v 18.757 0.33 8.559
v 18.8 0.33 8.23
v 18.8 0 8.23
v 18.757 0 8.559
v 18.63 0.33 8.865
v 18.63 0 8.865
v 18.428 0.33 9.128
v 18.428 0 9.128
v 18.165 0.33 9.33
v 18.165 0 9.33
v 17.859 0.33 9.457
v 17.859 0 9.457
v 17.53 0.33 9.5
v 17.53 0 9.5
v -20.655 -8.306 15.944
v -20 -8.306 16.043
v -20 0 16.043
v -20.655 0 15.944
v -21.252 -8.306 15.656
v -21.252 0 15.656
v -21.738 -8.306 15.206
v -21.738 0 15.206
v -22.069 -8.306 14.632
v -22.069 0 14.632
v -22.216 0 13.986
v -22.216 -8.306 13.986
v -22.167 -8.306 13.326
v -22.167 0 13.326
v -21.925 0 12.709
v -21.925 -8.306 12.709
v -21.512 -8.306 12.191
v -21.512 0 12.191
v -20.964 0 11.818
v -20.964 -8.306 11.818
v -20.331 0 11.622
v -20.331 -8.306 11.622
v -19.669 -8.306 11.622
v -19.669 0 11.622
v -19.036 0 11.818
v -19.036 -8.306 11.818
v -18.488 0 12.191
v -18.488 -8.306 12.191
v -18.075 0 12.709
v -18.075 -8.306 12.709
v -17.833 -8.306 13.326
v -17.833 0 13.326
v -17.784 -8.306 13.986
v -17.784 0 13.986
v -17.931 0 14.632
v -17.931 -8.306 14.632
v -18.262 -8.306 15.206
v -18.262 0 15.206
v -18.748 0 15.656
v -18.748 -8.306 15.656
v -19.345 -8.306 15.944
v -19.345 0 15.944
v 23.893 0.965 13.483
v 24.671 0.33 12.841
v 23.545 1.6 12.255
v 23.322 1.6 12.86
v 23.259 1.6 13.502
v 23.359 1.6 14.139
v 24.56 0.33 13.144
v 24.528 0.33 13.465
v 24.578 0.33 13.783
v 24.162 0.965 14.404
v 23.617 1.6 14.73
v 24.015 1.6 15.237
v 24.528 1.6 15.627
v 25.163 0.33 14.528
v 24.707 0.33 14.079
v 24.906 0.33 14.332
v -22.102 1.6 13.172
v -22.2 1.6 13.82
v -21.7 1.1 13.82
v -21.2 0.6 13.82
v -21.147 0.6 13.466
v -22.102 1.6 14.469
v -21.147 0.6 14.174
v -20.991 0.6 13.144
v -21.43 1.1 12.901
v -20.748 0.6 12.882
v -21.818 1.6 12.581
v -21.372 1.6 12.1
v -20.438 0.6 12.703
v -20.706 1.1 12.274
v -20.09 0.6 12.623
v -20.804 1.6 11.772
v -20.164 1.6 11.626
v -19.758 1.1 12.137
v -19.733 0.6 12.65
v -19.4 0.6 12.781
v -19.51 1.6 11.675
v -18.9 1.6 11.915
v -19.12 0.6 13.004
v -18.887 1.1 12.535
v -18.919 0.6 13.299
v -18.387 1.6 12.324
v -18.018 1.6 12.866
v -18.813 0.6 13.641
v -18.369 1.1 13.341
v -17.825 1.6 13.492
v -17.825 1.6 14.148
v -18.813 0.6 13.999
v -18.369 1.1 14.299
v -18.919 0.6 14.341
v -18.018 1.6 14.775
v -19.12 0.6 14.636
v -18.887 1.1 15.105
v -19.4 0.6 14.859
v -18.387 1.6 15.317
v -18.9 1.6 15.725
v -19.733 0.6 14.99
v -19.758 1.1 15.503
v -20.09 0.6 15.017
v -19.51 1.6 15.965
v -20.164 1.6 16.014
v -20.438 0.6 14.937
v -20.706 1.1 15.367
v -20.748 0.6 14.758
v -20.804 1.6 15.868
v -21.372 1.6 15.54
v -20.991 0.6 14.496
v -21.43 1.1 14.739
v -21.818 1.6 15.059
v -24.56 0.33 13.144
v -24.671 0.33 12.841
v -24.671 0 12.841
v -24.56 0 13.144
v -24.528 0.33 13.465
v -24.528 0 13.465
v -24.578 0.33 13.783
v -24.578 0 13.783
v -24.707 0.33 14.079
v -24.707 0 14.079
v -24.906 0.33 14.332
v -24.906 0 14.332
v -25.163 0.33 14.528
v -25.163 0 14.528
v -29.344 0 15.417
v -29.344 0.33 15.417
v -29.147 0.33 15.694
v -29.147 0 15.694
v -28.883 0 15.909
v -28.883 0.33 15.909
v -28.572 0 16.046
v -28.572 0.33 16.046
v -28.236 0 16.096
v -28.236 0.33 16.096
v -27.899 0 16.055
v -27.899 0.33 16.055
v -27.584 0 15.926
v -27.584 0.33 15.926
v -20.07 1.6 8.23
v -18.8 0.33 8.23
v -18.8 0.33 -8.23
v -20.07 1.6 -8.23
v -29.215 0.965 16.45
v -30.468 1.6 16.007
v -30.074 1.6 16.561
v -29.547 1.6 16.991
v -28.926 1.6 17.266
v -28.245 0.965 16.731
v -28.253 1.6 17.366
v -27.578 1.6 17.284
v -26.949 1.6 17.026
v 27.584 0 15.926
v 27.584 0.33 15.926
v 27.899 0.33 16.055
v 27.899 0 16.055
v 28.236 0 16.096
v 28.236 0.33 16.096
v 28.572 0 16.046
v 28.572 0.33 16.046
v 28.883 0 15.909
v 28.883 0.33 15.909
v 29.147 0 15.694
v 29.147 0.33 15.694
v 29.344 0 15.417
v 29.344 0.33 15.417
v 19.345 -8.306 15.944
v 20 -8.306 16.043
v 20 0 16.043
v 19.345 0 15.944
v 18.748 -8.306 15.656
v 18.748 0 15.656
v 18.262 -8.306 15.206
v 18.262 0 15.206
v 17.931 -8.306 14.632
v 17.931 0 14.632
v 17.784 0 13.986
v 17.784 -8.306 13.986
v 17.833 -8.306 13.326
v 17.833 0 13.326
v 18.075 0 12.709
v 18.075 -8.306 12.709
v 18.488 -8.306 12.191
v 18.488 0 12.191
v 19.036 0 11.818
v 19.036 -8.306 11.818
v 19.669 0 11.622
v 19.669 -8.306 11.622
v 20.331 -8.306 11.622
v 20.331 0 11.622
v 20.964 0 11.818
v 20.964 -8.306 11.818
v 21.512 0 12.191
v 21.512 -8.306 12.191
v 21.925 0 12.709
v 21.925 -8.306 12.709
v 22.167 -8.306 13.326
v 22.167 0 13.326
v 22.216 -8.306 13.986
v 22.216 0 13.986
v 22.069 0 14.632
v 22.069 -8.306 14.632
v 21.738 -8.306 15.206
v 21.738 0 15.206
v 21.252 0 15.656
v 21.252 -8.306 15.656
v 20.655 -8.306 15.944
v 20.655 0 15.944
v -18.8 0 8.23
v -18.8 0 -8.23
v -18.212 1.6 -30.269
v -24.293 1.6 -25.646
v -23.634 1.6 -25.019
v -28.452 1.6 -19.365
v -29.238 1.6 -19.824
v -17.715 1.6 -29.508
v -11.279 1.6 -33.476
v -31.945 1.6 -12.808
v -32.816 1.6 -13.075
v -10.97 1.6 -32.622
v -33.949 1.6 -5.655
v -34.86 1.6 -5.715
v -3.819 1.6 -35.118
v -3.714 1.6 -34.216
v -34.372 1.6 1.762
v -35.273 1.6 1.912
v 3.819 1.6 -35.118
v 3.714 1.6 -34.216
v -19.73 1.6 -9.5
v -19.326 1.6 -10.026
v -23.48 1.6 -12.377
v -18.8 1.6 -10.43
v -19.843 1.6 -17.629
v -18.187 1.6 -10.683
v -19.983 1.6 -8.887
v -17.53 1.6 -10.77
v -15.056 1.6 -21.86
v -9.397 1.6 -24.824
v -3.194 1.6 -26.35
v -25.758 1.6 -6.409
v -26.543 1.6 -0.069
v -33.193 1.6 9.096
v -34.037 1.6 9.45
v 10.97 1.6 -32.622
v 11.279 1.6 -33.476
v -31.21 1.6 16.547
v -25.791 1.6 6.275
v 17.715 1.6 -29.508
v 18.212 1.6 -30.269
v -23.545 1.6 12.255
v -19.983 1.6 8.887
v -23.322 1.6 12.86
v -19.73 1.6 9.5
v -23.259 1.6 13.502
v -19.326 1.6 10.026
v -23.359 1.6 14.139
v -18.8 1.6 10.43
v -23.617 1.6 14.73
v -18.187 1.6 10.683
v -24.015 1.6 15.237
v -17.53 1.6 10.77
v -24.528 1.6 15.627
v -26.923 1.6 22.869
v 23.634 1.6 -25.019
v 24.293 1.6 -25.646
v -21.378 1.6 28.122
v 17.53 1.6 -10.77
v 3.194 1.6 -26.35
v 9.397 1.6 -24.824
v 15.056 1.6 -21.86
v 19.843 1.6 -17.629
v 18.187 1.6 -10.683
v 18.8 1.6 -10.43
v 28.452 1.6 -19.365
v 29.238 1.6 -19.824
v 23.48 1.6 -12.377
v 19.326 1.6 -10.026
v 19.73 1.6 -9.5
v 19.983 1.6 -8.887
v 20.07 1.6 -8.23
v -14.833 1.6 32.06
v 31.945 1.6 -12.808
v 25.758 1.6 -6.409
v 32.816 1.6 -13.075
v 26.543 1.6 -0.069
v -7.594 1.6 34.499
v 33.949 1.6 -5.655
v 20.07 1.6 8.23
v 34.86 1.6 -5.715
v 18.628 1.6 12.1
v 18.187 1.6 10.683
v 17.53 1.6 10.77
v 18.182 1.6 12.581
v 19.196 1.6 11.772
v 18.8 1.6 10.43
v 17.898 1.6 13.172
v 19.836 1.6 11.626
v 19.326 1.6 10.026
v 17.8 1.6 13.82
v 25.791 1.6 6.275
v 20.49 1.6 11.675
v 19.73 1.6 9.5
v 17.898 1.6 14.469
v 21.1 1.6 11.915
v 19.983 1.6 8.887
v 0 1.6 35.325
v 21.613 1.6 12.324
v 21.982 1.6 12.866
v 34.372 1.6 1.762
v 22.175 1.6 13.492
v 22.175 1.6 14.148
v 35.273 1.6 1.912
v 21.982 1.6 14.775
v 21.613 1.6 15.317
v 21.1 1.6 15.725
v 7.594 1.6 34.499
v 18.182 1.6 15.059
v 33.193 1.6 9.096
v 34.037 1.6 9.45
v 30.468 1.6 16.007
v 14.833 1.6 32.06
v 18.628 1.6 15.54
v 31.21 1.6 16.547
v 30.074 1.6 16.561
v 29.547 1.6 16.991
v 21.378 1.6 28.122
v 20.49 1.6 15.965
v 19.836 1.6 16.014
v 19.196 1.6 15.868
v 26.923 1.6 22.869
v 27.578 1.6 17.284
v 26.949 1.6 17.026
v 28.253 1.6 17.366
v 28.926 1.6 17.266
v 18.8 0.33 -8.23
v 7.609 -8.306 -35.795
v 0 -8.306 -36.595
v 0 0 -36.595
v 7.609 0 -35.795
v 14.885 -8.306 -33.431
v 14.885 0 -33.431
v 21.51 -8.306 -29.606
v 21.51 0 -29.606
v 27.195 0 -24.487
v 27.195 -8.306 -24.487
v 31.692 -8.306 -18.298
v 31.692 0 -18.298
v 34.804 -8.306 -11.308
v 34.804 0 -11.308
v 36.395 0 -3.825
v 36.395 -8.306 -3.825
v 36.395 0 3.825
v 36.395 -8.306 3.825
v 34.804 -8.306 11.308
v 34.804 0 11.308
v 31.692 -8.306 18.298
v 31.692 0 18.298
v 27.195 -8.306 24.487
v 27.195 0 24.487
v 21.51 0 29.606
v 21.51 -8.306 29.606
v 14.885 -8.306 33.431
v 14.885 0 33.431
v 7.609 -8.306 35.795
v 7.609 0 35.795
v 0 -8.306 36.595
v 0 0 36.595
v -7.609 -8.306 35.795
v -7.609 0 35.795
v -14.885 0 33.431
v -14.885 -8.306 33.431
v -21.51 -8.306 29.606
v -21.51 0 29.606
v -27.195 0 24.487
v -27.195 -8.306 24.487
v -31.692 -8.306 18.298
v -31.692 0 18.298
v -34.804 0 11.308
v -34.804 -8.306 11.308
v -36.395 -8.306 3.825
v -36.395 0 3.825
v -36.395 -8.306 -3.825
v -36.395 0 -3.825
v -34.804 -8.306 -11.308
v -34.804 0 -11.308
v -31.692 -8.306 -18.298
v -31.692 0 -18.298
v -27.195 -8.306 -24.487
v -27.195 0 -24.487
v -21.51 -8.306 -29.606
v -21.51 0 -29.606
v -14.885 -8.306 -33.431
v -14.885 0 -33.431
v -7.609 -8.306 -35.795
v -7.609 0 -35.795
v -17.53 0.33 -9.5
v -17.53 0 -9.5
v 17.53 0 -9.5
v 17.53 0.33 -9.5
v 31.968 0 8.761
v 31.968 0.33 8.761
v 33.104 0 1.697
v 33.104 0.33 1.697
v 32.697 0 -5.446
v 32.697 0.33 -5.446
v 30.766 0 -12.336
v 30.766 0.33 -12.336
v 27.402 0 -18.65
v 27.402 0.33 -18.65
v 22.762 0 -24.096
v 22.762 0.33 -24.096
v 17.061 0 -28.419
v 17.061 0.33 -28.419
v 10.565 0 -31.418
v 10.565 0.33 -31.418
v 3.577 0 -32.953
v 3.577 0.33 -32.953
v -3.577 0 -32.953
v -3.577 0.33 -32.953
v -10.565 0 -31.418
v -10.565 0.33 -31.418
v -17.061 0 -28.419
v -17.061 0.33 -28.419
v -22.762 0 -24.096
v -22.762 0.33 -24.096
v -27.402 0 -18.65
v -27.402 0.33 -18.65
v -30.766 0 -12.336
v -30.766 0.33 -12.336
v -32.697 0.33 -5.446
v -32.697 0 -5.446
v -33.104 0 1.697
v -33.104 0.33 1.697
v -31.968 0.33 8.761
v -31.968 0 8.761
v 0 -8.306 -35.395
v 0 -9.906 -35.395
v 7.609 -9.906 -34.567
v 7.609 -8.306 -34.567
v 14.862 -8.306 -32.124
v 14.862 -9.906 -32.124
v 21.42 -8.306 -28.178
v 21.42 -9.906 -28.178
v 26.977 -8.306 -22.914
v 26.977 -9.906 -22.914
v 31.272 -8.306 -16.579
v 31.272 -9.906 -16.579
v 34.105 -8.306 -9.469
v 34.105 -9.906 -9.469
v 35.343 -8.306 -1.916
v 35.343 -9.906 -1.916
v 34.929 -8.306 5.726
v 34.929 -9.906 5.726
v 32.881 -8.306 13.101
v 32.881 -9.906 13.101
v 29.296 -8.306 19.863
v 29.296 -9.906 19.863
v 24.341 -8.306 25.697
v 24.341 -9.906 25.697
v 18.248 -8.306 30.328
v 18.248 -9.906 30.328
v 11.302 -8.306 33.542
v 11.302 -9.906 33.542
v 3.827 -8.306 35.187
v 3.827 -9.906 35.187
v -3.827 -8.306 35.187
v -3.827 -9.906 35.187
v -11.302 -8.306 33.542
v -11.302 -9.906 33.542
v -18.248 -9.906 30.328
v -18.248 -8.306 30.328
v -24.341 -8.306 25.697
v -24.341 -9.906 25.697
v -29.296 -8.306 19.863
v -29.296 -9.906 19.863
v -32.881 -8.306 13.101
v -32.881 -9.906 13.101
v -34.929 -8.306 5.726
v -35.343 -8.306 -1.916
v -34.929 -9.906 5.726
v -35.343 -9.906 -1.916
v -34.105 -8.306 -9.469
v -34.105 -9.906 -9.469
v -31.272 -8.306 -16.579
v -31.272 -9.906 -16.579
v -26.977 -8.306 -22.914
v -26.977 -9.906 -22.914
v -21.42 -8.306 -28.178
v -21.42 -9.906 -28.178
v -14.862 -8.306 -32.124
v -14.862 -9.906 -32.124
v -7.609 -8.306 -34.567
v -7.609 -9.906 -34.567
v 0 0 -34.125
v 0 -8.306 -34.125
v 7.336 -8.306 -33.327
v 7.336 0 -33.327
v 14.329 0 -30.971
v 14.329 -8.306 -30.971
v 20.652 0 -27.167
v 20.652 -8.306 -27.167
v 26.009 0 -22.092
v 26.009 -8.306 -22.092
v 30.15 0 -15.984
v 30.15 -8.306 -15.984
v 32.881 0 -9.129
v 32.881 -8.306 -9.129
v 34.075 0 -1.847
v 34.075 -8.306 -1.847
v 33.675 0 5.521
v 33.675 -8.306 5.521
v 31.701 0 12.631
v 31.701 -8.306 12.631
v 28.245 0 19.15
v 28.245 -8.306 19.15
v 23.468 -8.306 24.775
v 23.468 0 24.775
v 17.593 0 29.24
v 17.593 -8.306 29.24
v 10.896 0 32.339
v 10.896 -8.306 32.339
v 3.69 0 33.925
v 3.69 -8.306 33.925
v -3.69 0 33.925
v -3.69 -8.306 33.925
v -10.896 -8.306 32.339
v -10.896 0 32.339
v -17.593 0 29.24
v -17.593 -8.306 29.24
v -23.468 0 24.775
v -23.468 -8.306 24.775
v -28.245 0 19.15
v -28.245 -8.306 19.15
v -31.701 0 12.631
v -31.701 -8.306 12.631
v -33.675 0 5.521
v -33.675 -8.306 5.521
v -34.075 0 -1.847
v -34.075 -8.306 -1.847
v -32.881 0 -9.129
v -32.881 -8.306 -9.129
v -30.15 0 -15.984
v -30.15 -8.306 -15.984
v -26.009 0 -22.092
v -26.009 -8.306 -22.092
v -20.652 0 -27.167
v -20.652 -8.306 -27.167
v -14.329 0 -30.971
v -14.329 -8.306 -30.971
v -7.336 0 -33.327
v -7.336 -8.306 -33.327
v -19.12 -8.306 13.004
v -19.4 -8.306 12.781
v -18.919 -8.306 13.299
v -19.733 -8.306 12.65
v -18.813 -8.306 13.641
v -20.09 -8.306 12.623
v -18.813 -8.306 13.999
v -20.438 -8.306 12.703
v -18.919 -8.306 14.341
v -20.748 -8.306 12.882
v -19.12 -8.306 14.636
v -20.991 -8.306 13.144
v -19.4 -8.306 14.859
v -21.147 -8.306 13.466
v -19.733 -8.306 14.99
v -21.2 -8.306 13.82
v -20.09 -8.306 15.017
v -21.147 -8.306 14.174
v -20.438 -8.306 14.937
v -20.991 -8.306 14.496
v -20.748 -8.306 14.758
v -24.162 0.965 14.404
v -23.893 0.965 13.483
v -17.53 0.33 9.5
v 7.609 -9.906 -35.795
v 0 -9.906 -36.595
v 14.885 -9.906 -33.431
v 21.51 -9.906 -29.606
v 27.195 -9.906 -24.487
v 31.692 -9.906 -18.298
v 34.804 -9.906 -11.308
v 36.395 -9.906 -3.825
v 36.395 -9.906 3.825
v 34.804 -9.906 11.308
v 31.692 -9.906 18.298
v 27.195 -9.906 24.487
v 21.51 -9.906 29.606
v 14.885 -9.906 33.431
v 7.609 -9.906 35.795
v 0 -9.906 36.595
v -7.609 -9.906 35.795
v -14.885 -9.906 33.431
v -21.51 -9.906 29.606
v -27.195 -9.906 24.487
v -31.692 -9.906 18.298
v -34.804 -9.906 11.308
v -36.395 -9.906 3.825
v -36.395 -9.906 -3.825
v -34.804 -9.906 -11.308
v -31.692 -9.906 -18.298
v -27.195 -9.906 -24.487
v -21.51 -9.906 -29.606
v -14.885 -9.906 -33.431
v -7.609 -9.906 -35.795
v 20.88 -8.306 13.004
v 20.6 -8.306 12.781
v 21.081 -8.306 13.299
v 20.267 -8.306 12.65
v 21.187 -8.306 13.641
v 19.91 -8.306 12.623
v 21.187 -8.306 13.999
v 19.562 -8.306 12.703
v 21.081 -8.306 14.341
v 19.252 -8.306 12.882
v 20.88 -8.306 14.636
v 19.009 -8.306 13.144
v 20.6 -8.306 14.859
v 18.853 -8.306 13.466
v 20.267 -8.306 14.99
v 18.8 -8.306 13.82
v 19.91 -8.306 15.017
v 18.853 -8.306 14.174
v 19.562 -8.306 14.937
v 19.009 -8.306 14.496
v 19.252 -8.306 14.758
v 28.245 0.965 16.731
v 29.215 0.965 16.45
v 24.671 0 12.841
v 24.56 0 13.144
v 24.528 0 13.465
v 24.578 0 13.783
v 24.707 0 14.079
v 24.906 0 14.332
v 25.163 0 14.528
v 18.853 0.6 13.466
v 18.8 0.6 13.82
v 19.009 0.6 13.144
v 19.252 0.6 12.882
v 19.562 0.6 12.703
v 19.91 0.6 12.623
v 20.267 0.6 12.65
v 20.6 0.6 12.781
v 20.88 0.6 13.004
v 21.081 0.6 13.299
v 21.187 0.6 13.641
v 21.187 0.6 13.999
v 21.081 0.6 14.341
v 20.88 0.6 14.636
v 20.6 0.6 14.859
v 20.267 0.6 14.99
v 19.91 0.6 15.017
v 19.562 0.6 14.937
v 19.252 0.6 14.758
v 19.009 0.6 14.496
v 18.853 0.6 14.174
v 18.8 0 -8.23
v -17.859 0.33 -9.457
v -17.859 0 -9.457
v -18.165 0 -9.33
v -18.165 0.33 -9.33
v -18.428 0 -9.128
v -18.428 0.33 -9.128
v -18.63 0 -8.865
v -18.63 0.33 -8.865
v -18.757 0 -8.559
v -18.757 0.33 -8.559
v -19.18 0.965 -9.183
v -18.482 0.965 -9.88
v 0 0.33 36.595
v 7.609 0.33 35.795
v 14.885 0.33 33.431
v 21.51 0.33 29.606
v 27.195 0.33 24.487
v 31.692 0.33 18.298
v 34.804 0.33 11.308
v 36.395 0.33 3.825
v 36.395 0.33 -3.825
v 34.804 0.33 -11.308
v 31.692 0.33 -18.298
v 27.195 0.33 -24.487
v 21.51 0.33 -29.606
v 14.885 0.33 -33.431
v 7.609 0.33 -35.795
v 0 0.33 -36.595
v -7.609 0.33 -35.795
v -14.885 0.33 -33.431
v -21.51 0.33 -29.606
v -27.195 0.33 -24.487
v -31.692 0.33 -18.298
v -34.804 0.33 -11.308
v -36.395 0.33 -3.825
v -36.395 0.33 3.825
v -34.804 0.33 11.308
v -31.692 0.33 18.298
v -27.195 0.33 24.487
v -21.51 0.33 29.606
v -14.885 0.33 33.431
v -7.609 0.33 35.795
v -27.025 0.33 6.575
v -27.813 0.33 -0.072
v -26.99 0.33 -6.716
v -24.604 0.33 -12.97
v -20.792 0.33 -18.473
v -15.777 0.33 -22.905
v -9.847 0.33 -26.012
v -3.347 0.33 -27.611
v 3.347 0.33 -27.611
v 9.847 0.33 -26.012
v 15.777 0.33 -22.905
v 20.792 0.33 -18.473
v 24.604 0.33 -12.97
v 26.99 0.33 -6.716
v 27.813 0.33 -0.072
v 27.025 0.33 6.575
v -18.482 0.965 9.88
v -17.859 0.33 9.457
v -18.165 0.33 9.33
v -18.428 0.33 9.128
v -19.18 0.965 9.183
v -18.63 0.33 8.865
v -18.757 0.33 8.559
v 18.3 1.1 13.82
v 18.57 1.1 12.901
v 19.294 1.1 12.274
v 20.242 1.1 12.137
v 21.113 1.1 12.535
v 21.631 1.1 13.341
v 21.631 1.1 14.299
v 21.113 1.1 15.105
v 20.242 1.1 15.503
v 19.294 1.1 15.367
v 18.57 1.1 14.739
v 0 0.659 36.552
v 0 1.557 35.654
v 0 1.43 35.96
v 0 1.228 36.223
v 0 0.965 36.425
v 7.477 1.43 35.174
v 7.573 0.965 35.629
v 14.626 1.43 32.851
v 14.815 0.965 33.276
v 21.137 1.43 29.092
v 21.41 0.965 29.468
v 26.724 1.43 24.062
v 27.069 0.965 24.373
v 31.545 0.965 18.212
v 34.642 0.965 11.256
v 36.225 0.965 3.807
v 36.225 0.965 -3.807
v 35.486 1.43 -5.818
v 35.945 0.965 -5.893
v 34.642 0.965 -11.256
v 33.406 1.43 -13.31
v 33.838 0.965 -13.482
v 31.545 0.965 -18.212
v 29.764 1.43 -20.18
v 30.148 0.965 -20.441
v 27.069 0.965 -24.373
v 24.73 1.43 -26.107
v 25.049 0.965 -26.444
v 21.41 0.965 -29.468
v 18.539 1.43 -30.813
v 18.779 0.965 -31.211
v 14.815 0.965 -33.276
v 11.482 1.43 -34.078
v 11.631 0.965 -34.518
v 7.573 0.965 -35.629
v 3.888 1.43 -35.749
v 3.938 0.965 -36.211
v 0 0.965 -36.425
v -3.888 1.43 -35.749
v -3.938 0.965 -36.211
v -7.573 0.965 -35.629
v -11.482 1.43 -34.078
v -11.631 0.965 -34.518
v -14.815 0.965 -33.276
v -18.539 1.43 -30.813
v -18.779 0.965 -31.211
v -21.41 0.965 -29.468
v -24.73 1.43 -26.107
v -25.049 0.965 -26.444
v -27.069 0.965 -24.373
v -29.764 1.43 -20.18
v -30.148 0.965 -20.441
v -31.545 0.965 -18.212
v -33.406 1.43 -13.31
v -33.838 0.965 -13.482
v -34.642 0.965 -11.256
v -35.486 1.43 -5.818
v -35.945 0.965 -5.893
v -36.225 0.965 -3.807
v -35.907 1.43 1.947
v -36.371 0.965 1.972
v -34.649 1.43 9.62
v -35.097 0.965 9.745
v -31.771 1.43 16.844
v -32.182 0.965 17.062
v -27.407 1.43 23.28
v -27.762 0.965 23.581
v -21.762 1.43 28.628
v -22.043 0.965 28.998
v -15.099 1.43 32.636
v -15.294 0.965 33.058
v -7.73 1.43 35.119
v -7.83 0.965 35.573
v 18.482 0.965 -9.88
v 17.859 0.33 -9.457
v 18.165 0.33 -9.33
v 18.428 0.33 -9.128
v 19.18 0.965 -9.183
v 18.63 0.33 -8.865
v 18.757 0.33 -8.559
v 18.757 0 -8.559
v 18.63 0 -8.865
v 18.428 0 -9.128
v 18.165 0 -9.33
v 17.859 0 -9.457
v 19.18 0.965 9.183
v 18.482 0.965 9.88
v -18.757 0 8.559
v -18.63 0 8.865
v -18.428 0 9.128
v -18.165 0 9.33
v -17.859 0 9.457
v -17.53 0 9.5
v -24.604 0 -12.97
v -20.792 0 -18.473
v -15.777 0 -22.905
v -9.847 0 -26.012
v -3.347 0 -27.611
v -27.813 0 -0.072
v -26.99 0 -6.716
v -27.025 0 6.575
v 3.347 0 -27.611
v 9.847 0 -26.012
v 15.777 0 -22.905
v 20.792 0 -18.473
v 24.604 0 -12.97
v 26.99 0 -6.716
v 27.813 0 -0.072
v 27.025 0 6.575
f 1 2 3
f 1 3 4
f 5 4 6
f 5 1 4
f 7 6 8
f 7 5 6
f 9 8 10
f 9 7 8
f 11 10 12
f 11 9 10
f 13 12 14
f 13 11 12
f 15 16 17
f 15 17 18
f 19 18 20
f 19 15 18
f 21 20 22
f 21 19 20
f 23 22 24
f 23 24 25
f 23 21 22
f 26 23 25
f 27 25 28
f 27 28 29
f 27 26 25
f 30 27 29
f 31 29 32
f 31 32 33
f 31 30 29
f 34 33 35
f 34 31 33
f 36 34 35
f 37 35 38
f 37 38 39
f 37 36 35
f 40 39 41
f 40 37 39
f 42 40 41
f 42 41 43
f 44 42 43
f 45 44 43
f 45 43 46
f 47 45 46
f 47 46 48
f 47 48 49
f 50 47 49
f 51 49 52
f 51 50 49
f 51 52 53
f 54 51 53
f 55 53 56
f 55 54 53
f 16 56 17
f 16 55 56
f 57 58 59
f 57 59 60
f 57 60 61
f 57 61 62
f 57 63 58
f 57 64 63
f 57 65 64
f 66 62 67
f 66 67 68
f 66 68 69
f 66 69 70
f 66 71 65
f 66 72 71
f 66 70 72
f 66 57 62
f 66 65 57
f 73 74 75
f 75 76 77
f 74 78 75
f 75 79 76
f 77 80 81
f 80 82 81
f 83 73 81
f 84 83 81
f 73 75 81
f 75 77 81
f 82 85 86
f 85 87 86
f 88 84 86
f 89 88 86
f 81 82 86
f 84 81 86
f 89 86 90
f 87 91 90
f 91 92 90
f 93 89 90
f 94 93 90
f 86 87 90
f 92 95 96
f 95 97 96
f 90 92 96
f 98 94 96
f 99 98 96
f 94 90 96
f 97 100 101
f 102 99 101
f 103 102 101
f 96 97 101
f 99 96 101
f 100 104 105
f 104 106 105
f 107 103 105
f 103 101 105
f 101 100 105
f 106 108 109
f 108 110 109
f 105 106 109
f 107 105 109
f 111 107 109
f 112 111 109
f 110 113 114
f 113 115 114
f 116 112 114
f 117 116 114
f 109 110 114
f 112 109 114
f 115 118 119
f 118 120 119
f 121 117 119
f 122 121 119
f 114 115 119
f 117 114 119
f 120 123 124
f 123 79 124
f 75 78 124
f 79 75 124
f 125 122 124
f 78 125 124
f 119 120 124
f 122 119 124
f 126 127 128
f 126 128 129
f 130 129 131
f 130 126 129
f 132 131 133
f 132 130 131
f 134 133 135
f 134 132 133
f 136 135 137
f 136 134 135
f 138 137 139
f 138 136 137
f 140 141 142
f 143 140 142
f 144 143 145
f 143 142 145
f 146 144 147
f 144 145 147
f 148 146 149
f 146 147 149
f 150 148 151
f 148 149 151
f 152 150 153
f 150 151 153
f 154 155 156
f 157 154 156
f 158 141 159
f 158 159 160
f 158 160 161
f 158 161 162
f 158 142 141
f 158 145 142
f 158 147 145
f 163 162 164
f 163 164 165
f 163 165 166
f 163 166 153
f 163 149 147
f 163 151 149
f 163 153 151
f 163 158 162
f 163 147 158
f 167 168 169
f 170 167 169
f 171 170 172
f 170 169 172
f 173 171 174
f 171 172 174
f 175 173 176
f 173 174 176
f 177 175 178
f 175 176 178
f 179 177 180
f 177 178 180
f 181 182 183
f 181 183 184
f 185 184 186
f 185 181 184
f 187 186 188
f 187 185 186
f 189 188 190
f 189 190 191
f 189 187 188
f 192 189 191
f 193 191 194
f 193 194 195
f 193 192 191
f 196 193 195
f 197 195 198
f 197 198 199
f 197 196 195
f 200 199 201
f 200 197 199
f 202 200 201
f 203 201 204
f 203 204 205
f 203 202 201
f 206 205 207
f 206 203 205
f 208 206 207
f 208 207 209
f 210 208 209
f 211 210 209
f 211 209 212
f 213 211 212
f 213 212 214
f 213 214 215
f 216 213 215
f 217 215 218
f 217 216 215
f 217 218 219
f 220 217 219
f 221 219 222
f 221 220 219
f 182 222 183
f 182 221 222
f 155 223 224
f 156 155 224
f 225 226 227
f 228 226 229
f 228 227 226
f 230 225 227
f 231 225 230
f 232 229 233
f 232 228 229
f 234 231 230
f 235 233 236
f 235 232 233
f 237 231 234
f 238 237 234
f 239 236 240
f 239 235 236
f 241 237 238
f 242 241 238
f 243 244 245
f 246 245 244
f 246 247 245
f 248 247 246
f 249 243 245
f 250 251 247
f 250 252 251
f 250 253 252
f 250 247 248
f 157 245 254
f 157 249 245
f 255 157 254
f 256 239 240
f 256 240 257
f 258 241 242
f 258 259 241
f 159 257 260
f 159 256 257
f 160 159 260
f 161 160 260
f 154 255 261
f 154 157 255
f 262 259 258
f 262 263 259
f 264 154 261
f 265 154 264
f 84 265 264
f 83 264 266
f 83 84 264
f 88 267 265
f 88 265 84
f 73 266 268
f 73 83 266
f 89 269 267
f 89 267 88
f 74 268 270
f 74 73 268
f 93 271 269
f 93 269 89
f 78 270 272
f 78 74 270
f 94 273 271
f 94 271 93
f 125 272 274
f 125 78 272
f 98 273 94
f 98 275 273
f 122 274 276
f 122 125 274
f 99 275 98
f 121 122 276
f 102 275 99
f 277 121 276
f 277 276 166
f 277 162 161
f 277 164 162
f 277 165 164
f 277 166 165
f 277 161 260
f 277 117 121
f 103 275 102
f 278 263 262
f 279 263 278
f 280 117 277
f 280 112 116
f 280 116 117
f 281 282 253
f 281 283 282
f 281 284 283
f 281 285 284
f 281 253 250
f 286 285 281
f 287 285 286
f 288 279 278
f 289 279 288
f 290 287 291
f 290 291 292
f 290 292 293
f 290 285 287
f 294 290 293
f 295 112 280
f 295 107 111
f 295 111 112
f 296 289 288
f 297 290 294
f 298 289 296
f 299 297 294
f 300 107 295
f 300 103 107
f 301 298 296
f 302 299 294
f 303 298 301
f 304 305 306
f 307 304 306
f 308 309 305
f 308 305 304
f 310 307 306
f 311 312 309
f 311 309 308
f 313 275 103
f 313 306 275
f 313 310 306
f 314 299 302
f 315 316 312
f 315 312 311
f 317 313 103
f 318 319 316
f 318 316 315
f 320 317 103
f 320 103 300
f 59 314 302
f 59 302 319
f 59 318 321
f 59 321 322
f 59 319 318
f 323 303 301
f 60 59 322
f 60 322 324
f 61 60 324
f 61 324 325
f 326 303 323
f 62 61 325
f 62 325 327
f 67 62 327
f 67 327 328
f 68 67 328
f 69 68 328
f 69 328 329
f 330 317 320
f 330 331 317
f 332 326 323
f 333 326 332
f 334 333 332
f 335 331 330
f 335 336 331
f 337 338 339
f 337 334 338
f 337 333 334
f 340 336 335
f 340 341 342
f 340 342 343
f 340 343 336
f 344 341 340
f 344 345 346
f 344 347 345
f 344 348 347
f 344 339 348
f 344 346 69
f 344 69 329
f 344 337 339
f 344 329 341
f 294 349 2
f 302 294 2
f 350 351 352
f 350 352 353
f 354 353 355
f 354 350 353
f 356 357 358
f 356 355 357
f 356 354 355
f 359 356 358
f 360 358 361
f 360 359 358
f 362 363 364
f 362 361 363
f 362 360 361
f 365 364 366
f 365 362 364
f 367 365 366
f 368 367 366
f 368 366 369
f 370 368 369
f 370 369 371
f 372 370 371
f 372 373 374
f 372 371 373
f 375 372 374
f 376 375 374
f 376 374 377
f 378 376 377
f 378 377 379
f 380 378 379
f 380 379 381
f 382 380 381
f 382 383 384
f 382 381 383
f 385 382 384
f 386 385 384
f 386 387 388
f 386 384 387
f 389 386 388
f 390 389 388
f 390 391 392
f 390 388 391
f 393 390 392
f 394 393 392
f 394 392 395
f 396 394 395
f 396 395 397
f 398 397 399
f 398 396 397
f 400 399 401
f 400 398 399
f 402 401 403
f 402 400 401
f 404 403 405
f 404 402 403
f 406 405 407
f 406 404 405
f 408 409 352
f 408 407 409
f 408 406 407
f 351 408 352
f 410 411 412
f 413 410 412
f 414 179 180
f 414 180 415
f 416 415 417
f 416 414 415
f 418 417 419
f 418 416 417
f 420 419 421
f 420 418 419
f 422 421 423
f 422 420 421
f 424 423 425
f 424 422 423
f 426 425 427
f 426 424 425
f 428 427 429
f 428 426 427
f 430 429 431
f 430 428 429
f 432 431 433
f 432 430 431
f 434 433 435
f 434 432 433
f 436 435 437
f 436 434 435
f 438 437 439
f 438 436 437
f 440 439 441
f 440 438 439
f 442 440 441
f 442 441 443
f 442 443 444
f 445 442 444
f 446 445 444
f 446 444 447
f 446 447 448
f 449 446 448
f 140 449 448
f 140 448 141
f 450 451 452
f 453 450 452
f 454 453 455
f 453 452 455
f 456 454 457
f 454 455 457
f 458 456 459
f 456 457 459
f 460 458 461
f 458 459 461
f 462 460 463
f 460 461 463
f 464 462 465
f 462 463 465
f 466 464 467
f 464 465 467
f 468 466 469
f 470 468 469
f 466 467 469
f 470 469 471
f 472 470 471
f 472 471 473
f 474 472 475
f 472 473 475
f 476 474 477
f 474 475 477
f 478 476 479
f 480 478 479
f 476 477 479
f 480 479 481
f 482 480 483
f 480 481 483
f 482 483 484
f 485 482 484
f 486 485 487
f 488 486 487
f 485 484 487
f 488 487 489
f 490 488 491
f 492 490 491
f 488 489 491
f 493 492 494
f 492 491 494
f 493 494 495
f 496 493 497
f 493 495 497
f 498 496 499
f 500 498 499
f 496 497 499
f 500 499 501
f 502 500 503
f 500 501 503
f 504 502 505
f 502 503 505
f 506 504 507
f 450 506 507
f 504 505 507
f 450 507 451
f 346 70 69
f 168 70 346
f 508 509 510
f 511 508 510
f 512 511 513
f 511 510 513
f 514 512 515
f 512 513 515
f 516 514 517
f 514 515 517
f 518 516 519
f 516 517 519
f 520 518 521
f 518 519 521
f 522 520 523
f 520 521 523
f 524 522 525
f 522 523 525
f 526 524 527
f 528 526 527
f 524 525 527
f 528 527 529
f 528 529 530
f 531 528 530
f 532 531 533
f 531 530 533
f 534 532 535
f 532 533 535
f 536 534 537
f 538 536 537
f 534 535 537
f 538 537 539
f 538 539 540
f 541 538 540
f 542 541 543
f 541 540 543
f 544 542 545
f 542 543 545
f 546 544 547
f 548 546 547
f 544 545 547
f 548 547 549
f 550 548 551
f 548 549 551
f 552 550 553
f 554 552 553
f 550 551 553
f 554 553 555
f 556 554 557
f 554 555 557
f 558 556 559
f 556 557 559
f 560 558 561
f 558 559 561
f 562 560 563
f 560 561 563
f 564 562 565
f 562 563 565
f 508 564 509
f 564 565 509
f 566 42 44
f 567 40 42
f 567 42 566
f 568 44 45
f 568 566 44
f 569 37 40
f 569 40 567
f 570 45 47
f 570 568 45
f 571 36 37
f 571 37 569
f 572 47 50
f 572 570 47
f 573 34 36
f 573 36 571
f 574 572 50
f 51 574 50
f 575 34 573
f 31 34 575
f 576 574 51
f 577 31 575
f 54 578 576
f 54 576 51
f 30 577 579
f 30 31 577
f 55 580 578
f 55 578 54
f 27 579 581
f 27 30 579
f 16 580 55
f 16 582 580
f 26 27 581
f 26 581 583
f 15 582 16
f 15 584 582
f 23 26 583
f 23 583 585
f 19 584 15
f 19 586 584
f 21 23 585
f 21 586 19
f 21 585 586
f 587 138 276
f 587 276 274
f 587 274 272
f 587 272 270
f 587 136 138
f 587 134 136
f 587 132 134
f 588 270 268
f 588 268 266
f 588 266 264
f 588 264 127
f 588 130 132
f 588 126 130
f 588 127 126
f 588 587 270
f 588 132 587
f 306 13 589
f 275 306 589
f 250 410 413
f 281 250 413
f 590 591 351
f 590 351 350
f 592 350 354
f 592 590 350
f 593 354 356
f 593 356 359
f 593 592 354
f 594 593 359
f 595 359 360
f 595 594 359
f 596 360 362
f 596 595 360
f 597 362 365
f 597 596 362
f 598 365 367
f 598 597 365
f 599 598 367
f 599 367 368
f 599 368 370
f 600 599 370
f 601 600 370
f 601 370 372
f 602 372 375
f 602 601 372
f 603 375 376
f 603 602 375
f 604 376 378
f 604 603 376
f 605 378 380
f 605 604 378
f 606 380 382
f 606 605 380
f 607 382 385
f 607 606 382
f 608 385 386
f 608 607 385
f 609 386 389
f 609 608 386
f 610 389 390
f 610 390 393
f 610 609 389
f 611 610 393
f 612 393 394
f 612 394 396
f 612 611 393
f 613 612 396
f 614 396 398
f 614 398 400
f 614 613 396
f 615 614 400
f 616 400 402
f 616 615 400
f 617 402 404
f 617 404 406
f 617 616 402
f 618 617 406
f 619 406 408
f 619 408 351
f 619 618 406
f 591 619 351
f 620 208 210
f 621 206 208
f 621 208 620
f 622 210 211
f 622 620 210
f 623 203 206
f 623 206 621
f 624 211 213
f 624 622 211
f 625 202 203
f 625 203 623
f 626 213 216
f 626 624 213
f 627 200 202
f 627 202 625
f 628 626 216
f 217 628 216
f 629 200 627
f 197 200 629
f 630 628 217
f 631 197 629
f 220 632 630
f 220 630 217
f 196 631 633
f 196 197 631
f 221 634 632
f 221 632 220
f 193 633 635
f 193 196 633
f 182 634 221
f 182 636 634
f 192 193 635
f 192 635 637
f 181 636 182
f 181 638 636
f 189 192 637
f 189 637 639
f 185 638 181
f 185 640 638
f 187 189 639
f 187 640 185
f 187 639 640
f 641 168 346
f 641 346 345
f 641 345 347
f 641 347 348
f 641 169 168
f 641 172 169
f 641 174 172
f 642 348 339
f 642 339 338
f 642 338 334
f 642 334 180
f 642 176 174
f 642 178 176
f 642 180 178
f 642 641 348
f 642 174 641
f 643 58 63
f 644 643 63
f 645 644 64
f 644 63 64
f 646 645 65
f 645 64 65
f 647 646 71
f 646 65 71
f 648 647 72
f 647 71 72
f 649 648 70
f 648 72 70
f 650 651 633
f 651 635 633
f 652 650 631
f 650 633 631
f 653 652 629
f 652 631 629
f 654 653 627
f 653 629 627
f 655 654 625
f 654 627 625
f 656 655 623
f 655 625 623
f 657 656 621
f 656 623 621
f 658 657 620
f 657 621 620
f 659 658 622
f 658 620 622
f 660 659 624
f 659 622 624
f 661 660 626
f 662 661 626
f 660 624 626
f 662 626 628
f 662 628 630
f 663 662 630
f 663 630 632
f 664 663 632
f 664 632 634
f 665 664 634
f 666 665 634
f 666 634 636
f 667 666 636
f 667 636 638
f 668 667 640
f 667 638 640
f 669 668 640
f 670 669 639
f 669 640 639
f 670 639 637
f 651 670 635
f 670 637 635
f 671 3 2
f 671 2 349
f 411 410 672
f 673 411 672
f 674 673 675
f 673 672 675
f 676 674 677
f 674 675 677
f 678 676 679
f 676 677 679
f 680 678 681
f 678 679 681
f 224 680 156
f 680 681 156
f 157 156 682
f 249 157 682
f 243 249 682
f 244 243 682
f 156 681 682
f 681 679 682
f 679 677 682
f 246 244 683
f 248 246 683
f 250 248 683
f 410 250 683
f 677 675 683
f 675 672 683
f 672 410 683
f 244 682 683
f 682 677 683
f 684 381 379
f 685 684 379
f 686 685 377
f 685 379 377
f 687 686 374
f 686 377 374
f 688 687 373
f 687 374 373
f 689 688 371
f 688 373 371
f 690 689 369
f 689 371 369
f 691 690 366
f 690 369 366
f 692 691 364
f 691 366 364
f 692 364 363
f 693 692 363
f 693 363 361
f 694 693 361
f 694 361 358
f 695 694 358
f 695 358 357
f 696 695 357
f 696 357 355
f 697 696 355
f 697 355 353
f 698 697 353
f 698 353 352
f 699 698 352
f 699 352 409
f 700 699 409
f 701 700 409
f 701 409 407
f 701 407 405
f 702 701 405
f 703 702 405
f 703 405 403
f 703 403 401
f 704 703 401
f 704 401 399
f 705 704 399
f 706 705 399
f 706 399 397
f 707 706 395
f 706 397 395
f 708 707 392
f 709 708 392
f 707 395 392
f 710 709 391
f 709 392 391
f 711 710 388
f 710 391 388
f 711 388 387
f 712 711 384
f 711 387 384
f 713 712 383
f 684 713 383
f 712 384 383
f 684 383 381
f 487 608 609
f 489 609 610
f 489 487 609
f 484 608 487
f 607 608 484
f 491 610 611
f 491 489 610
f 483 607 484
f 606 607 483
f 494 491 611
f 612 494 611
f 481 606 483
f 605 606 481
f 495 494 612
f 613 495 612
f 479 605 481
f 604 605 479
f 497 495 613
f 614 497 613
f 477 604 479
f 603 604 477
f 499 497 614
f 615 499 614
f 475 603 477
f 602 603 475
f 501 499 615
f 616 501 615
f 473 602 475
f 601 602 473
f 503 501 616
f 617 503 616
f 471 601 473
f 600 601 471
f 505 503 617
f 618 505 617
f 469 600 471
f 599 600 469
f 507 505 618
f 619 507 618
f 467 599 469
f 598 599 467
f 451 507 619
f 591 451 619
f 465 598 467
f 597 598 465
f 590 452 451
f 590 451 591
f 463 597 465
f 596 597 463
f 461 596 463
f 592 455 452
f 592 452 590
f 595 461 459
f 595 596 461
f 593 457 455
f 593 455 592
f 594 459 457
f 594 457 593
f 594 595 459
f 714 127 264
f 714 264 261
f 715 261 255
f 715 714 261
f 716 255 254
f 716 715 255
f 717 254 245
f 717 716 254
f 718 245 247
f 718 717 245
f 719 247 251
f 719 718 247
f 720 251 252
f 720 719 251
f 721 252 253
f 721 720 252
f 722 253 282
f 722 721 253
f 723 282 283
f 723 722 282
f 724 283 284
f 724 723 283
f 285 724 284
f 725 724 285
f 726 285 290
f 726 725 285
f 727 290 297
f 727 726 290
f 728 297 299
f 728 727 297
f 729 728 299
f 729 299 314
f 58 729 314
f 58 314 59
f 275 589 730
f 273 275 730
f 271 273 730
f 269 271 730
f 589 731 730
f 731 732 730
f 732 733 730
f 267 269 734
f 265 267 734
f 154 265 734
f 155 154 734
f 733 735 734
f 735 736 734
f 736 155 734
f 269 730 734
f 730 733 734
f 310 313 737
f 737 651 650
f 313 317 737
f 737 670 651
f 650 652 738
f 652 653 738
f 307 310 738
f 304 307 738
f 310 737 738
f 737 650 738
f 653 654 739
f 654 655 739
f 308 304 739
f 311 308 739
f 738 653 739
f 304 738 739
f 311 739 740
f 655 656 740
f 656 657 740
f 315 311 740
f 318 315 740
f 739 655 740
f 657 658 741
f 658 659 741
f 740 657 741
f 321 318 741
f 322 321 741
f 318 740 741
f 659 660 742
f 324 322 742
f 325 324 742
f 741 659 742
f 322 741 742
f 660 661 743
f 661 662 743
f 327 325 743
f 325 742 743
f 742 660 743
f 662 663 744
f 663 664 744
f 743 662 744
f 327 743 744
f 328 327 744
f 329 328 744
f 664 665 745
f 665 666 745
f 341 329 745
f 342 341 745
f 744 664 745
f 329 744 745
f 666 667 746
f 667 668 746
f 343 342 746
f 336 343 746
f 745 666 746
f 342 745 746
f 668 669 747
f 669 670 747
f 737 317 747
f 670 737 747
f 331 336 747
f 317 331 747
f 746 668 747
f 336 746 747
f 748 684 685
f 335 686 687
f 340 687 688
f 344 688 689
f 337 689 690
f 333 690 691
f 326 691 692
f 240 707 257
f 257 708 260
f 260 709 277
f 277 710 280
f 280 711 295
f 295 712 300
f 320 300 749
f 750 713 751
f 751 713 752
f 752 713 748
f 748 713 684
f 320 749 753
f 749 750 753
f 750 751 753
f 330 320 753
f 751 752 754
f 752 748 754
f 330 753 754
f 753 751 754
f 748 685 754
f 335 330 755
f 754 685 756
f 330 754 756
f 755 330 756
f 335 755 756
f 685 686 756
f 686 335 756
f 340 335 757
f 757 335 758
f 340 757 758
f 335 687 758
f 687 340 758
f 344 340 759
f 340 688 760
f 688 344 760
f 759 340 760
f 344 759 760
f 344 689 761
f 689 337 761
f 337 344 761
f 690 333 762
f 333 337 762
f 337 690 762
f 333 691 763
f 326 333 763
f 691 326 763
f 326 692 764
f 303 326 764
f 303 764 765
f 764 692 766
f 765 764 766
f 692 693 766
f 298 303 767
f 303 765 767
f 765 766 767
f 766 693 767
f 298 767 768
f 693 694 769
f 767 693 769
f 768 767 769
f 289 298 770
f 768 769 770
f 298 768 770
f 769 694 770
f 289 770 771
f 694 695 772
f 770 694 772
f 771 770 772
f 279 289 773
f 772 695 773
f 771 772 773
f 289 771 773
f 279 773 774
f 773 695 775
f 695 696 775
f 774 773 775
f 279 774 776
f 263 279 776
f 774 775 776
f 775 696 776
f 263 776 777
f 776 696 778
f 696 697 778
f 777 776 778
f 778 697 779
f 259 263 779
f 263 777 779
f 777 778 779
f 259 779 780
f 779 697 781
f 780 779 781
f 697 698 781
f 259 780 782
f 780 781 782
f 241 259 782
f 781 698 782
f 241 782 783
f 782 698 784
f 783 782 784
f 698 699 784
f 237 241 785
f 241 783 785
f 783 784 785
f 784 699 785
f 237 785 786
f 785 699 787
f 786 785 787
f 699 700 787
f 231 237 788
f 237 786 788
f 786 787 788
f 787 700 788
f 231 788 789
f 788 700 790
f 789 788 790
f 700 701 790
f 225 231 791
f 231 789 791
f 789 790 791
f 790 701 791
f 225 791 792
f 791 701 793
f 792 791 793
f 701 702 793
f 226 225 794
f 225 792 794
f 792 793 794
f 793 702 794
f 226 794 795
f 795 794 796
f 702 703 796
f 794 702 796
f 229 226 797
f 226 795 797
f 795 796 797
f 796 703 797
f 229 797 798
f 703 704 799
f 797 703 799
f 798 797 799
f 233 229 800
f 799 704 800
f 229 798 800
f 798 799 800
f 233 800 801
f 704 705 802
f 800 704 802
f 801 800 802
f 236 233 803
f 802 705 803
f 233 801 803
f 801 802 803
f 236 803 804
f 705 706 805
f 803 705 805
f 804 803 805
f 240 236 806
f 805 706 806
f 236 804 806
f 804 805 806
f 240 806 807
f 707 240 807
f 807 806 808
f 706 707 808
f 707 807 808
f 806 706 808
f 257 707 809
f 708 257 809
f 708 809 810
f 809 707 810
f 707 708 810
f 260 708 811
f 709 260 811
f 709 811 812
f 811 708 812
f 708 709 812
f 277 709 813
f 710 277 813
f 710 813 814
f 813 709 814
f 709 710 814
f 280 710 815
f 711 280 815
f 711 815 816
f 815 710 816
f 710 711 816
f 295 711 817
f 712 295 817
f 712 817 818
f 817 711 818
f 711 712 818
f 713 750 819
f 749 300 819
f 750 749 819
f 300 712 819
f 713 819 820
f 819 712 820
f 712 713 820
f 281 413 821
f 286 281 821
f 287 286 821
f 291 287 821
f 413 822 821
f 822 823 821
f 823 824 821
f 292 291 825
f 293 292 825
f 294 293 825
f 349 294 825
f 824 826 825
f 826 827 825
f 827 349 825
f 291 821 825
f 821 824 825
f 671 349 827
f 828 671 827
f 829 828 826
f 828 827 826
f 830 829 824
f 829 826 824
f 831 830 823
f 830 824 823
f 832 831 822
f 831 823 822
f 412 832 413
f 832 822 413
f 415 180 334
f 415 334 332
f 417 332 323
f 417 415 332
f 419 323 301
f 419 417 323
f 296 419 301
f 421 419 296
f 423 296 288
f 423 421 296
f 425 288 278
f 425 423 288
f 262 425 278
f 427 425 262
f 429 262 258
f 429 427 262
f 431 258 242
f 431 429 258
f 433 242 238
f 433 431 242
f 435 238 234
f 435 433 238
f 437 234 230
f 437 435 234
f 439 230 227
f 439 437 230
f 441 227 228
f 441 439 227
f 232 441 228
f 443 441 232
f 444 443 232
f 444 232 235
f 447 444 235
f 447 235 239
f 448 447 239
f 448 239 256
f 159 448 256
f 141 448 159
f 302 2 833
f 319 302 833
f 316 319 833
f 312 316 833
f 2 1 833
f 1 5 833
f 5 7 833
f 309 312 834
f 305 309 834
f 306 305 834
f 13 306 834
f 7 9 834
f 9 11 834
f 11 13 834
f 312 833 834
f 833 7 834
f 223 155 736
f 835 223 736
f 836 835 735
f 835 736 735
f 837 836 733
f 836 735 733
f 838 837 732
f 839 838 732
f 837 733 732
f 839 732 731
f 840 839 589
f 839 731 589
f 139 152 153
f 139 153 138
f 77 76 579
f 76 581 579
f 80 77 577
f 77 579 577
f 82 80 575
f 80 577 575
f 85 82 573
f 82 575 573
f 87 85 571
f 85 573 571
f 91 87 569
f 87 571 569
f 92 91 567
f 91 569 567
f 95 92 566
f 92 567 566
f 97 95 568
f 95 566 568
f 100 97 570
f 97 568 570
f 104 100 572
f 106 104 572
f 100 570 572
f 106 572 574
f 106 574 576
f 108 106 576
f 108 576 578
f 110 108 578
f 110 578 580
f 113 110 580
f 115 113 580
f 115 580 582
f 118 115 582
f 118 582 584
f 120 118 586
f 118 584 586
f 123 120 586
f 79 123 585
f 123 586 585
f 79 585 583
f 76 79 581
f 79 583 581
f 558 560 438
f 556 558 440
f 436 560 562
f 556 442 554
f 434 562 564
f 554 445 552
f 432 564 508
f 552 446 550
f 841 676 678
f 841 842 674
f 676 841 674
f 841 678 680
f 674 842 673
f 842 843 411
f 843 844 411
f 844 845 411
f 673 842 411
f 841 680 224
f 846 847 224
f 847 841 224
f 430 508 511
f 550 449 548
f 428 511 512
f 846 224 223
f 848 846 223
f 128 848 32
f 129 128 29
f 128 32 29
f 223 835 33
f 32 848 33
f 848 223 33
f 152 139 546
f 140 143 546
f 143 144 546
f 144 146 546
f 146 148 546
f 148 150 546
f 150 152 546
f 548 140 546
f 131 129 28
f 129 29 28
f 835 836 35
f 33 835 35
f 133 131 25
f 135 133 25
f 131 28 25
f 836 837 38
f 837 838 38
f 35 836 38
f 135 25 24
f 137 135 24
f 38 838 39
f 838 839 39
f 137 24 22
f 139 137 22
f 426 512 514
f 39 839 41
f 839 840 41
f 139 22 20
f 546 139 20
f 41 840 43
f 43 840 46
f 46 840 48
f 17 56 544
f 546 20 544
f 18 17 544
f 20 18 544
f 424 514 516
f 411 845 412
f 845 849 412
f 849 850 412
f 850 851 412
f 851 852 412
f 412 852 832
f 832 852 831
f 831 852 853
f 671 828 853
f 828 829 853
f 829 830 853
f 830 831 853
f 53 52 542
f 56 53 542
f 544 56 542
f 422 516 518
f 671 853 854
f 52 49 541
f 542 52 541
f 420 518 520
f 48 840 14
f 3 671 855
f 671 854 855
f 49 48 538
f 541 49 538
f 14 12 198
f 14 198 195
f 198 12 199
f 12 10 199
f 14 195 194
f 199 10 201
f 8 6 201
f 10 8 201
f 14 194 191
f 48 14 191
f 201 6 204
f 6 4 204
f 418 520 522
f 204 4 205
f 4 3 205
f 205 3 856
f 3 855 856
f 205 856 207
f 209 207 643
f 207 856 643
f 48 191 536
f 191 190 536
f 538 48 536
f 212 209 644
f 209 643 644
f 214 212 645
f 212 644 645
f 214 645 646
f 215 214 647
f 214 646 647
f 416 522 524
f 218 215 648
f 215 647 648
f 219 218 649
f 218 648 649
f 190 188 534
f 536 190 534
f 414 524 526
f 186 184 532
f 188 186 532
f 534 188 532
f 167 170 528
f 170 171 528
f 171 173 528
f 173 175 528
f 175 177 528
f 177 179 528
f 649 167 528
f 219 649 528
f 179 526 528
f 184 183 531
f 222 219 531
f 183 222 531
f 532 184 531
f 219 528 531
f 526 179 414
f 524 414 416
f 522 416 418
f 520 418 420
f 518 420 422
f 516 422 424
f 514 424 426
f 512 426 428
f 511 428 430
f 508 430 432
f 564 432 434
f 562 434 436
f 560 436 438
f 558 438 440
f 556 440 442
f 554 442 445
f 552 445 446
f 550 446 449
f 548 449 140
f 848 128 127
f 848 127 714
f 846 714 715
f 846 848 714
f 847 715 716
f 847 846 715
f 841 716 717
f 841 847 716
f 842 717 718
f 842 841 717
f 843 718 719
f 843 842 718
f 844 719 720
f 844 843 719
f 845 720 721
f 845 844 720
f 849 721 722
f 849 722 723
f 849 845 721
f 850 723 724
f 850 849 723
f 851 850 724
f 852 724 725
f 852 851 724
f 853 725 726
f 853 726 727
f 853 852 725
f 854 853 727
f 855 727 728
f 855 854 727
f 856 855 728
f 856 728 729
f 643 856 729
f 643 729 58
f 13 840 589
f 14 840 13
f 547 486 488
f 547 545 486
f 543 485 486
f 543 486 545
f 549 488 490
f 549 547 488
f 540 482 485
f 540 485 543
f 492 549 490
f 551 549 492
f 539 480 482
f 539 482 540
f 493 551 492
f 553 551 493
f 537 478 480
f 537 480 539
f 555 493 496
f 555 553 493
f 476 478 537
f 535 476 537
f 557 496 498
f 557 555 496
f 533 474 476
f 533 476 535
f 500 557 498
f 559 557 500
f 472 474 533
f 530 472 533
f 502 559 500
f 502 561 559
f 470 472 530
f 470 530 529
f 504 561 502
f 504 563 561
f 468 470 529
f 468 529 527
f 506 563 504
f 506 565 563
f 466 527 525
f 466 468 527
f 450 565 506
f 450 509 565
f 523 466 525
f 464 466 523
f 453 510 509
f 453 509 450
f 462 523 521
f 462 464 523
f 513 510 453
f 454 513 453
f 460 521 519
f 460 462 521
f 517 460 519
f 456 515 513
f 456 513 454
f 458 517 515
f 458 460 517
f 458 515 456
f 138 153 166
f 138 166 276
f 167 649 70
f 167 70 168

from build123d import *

# Parameters (mm, degrees)
SKETCH1_R                                       = 36.59505
SKETCH1_W                                       = 37.6
SKETCH1_H                                       = 19
BOSS_EXTRUDE1_DEPTH                             = 1.6
BOSS_EXTRUDE2_START                             = 8.3058
SKETCH2_R                                       = 36.59505
SKETCH2_R_2                                     = 34.1249
SKETCH2_R_3                                     = 2.2225
BOSS_EXTRUDE2_DEPTH                             = 8.3058
CSK_FOR_M2_FLAT_HEAD_MACHINE_SCREW1_D           = 2.4
CSK_FOR_M2_FLAT_HEAD_MACHINE_SCREW1_CSINK_D     = 4.4
CSK_FOR_M2_FLAT_HEAD_MACHINE_SCREW1_CSINK_ANGLE = 90
FILLET1_R                                       = 1.27
BOSS_EXTRUDE3_START                             = 1.6
SKETCH5_R                                       = 36.59505
SKETCH5_R_2                                     = 35.3949
BOSS_EXTRUDE3_DEPTH                             = 1.6
CHAMFER2_SIZE                                   = 1.27
FILLET2_R                                       = 1.27


with BuildPart() as part:
    # Sketch1 → Boss-Extrude1 (new body)
    with BuildSketch(Plane(origin=(0, 0, 0), x_dir=(1, 0, 0), z_dir=(0, 1, 0))):
        with Locations(Location((0, 0, 0), (0, 0, 270))):
            Circle(SKETCH1_R)
        with BuildLine():
            Line((-28.706144728, -16.573500386), (-24.086765224, -13.906500386))
            ThreePointArc((-24.086765224, -13.906500386), (0, 27.813000772), (24.086765224, -13.906500386))
            Line((24.086765224, -13.906500386), (28.706144728, -16.573500386))
            ThreePointArc((28.706144728, -16.573500386), (0, 33.147000772), (-28.706144728, -16.573500386))
        make_face(mode=Mode.SUBTRACT)
        Rectangle(SKETCH1_W, SKETCH1_H, mode=Mode.SUBTRACT)
    extrude(amount=BOSS_EXTRUDE1_DEPTH)

    # Sketch2 → Boss-Extrude2 (add)
    # profile 1 of 3: a face of its own
    with BuildSketch(Plane.XZ.offset(BOSS_EXTRUDE2_START)):
        with Locations(Location((0, 0, 0), (0, 0, 270))):
            Circle(SKETCH2_R)
        with Locations(Location((0, 0, 0), (0, 0, 270))):
            Circle(SKETCH2_R_2, mode=Mode.SUBTRACT)
    # profile 2 of 3: a face of its own
    with BuildSketch(Plane.XZ.offset(BOSS_EXTRUDE2_START)):
        with Locations(Location((20, 13.82014, 0), (0, 0, 90))):
            Circle(SKETCH2_R_3)
    # profile 3 of 3: a face of its own
    with BuildSketch(Plane.XZ.offset(BOSS_EXTRUDE2_START)):
        with Locations(Location((-20, 13.82014, 0), (0, 0, 90))):
            Circle(SKETCH2_R_3)
    extrude(amount=-BOSS_EXTRUDE2_DEPTH)

    # CSK for M2 Flat Head Machine Screw1 (through all)
    with Locations(Plane(origin=(0, 1.6, 0), x_dir=(1, 0, 0), z_dir=(0, 1, 0))):
        with Locations((-20, -13.82014), (20, -13.82014)):
            CounterSinkHole(CSK_FOR_M2_FLAT_HEAD_MACHINE_SCREW1_D / 2, CSK_FOR_M2_FLAT_HEAD_MACHINE_SCREW1_CSINK_D / 2, counter_sink_angle=CSK_FOR_M2_FLAT_HEAD_MACHINE_SCREW1_CSINK_ANGLE)

    # Fillet1
    fillet1_edges = [part.edges().sort_by_distance(p)[0] for p in [
        (28.706144728, 0.8, 16.573500386),
        (-28.706144728, 0.8, 16.573500386),
        (-24.086765224, 0.8, 13.906500386),
        (24.086765224, 0.8, 13.906500386),
        (18.8, 0.8, -9.5),
        (-18.8, 0.8, -9.5),
        (-18.8, 0.8, 9.5),
        (18.8, 0.8, 9.5),
    ]]
    fillet(fillet1_edges, radius=FILLET1_R)

    # Sketch5 → Boss-Extrude3 (add)
    with BuildSketch(Plane.XZ.offset(8.3058).offset(BOSS_EXTRUDE3_START)):
        with Locations(Location((0, 0, 0), (0, 0, 270))):
            Circle(SKETCH5_R)
        with Locations(Location((0, 0, 0), (0, 0, 270))):
            Circle(SKETCH5_R_2, mode=Mode.SUBTRACT)
    extrude(amount=-BOSS_EXTRUDE3_DEPTH)

    # Chamfer2
    chamfer2_edges = [part.edges().sort_by_distance(p)[0] for p in [
        (-18.8, 1.6, 0),
        (0, 1.6, 9.5),
        (18.8, 1.6, 0),
        (0, 1.6, -9.5),
        (0, 1.6, -27.813000772),
        (26.373483072, 1.6, 15.226737551),
        (0, 1.6, -33.147000772),
        (-26.373483072, 1.6, 15.226737551),
        (-18.428025612, 1.6, 9.128025612),
        (18.428025612, 1.6, 9.128025612),
        (18.428025612, 1.6, -9.128025612),
        (-18.428025612, 1.6, -9.128025612),
        (24.57833714, 1.6, 13.783189465),
        (28.572450915, 1.6, 16.04592687),
        (-28.572450915, 1.6, 16.04592687),
        (-24.57833714, 1.6, 13.783189465),
    ]]
    chamfer(chamfer2_edges, length=CHAMFER2_SIZE)

    # Fillet2
    fillet2_edges = [part.edges().sort_by_distance(p)[0] for p in [
        (0, 1.6, -36.59505),
    ]]
    fillet(fillet2_edges, radius=FILLET2_R)


solid = part.part
